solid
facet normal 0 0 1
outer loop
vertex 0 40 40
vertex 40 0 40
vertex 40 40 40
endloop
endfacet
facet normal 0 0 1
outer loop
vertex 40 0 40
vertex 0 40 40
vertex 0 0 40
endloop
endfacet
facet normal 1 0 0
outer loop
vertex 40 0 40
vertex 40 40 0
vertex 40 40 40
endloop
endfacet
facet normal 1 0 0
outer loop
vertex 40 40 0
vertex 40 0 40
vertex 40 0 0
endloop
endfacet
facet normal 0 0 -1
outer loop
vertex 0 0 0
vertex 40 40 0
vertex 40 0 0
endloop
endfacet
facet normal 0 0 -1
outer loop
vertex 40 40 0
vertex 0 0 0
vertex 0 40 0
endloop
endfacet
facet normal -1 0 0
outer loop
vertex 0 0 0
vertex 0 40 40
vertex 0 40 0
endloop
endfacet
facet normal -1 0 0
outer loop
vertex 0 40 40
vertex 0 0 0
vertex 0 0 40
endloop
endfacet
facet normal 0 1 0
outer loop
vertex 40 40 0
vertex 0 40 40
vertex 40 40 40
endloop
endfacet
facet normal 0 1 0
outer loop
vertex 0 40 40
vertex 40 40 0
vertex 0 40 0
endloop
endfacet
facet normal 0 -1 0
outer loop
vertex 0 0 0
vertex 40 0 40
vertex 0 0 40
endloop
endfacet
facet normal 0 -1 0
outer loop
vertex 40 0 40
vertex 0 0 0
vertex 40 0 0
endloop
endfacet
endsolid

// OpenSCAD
// Smiley Cube — test model for per-face paint_color 3MF export
// A 40mm cube with a smiley face on the top surface.
//
// Render specific parts via the command line:
//   openscad -D 'part="body"' -o body.stl smiley_cube.scad
//   openscad -D 'part="face"' -o face.stl smiley_cube.scad
//
// Units: millimeters

// --- Part Selection ---
part = "all";  // "body", "face", or "all"

// --- Cube Parameters ---
cube_size = 40;

// --- Smiley Parameters ---
feature_depth = 0.4;  // thin raised features flush with top

// Eyes: two circles in the upper half of the top face
eye_radius = 3;
eye_spacing = 12;  // distance between eye centers
eye_y_offset = 6;  // offset from center toward top

// Mouth: crescent arc in the lower half
mouth_outer_r = 10;
mouth_inner_r = 7;
mouth_y_offset = -2;  // center of mouth arcs (below center)
mouth_clip_y = -3;    // clip above this Y relative to mouth center

$fn = 80;

// --- Modules ---

module eye(x_pos, y_pos) {
    translate([cube_size/2 + x_pos, cube_size/2 + y_pos, cube_size - feature_depth])
        cylinder(r=eye_radius, h=feature_depth);
}

module mouth() {
    translate([cube_size/2, cube_size/2 + mouth_y_offset, cube_size - feature_depth])
        linear_extrude(height=feature_depth)
            intersection() {
                difference() {
                    circle(r=mouth_outer_r);
                    circle(r=mouth_inner_r);
                }
                // Clip to bottom half of the arc
                translate([0, mouth_clip_y, 0])
                    square([mouth_outer_r * 3, mouth_outer_r * 2], center=true);
            }
}

module smiley_features() {
    eye(-eye_spacing/2, eye_y_offset);
    eye(eye_spacing/2, eye_y_offset);
    mouth();
}

module cube_body() {
    difference() {
        cube([cube_size, cube_size, cube_size]);
        smiley_features();
    }
}

// --- Render selected part ---
if (part == "body") {
    cube_body();
} else if (part == "face") {
    smiley_features();
} else {
    cube_body();
    color("gold") smiley_features();
}
